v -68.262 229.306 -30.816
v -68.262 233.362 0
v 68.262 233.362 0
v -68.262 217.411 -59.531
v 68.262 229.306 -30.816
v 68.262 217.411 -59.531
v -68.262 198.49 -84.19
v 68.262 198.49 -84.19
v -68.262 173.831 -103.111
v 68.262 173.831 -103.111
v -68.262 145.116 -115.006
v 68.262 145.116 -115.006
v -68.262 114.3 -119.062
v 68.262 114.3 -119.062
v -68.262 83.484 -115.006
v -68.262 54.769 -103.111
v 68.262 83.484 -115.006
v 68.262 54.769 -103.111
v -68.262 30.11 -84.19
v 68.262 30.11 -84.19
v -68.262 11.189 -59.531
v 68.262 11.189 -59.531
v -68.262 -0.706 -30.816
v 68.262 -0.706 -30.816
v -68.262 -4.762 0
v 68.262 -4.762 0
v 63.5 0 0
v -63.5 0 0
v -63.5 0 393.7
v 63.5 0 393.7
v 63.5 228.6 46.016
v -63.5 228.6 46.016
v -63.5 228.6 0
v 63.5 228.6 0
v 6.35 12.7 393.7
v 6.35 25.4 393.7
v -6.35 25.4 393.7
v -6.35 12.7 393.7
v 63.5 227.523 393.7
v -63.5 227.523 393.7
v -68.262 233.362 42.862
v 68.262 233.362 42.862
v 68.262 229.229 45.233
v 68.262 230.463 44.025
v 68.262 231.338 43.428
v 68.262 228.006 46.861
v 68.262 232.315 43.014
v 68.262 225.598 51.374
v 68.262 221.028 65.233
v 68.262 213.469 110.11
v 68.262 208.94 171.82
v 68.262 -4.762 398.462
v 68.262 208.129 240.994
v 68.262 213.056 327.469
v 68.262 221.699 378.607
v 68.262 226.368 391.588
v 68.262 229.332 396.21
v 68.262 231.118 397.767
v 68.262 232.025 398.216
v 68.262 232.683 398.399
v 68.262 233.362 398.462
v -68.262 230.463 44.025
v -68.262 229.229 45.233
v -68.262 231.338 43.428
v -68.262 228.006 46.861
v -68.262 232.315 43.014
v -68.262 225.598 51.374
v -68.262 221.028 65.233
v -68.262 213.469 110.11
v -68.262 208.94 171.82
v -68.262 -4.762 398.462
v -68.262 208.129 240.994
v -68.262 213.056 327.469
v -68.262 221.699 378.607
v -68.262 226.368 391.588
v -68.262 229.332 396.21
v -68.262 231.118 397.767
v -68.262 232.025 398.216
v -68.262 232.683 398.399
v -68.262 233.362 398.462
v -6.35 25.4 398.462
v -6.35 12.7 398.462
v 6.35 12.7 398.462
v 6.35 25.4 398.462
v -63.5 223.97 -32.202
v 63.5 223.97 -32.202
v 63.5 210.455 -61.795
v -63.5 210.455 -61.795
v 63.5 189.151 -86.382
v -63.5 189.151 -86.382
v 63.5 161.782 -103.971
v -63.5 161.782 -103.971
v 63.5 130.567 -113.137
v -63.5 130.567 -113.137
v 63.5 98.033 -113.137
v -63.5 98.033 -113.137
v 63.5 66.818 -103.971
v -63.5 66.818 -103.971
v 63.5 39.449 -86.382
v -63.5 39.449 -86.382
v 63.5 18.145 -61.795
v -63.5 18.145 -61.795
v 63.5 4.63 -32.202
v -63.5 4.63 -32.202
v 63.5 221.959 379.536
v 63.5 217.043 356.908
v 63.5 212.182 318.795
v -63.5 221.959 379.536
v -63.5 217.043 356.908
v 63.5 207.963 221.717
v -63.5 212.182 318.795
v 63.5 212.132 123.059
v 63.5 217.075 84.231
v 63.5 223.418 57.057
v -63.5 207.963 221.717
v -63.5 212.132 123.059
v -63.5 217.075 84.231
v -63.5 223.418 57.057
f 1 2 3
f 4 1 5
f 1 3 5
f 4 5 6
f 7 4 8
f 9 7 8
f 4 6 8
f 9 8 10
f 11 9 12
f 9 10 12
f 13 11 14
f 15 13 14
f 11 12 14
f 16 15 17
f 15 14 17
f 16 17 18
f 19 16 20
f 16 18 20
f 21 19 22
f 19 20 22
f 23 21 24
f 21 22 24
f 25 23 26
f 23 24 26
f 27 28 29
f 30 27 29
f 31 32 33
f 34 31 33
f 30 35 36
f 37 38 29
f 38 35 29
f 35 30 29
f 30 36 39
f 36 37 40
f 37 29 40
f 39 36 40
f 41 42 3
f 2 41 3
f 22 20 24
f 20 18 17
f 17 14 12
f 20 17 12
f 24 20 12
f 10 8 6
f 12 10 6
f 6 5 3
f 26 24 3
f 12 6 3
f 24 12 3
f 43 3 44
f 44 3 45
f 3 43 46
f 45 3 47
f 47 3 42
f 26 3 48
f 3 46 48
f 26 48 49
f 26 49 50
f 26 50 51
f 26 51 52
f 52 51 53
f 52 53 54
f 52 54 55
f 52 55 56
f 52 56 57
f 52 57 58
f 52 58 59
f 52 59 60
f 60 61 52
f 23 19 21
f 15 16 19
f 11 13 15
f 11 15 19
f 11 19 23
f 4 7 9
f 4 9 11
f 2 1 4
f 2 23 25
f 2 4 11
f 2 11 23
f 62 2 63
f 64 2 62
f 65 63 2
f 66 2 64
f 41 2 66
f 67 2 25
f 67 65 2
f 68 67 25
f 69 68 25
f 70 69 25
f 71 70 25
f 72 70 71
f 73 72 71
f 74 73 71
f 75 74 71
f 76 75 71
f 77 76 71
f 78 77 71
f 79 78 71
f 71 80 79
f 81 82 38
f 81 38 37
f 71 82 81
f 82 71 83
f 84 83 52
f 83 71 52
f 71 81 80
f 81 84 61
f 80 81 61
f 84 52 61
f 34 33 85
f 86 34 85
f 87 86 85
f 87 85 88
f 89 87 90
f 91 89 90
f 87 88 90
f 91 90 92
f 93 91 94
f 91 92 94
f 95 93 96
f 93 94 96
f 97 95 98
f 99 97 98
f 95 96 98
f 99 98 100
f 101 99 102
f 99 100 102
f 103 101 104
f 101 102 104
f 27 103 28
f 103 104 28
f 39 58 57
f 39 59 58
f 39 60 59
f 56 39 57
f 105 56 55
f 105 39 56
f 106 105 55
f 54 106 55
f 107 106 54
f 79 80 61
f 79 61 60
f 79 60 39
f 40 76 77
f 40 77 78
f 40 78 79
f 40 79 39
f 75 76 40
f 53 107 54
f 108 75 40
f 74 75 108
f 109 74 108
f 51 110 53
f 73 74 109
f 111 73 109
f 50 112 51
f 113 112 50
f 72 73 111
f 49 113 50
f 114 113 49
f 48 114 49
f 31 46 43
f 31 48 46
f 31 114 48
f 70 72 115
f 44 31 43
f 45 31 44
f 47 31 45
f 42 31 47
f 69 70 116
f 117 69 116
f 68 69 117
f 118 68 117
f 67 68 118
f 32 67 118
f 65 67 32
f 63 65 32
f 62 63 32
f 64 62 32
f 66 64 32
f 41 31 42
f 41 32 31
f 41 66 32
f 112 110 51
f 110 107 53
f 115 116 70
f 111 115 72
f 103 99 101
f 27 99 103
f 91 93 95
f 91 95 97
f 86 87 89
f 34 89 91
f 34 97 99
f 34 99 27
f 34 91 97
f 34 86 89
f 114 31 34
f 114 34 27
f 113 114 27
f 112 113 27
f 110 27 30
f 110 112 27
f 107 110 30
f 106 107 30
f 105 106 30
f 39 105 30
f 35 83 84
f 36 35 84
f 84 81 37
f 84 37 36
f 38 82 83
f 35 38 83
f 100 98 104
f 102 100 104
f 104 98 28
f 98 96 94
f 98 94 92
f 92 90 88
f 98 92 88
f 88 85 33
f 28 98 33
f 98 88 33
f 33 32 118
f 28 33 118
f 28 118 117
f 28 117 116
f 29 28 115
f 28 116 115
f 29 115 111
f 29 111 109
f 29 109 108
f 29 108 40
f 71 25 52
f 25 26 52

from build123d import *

# Parameters (mm, degrees)
BOSS_EXTRUDE1_DEPTH      = 63.5
BOSS_EXTRUDE1_DEPTH_BACK = 63.5
CUT_EXTRUDE1_REACH       = 573.246
SKETCH4_W                = 12.7
SKETCH4_H                = 12.7
BOSS_EXTRUDE3_DEPTH      = 4.7625
CUT_EXTRUDE2_DEPTH       = 467.787091958
CUT_EXTRUDE2_DEPTH_BACK  = 467.787091958
SKETCH11_RX              = 177.8
SKETCH11_RY              = 25.4


with BuildPart() as part:
    # Sketch2 → Boss-Extrude1 (new, two sides: drawn at the far end of the back side and taken through both)
    with BuildSketch(Plane(origin=(0, 0, 0), x_dir=(0, 0, -1), z_dir=(1, 0, 0)).offset(-BOSS_EXTRUDE1_DEPTH_BACK)):
        with BuildLine():
            Line((0, -4.7625), (-398.4625, -4.7625))
            Line((-398.4625, -4.7625), (-398.4625, 233.3625))
            Line((-398.4625, 233.3625), (0, 233.3625))
            ThreePointArc((0, 233.3625), (119.0625, 114.3), (0, -4.7625))
        make_face()
        with BuildLine():
            Line((0, 0), (-393.7, 0))
            Line((-393.7, 0), (-393.7, 228.6))
            Line((-393.7, 228.6), (0, 228.6))
            ThreePointArc((0, 228.6), (114.3, 114.3), (0, 0))
        make_face(mode=Mode.SUBTRACT)
    extrude(amount=BOSS_EXTRUDE1_DEPTH + BOSS_EXTRUDE1_DEPTH_BACK)

    # Sketch4 → Cut-Extrude1 (cut, up to next)
    with BuildSketch(Plane.XY.offset(398.4625), mode=Mode.PRIVATE) as cut_extrude1_sk1:
        with Locations((0, 19.05)):
            Rectangle(SKETCH4_W, SKETCH4_H)
    cut_extrude1_tool1 = extrude(cut_extrude1_sk1.sketch, amount=-CUT_EXTRUDE1_REACH, mode=Mode.PRIVATE) & part.part
    add(cut_extrude1_tool1.solids().sort_by_distance((0, 19.05, 398.4625))[0], mode=Mode.SUBTRACT)

    # Sketch9 → Boss-Extrude3 (add)
    with BuildSketch(Plane(origin=(63.5, 0, 0), x_dir=(0, 0, -1), z_dir=(1, 0, 0))):
        with BuildLine():
            Line((-398.4625, 233.3625), (0, 233.3625))
            ThreePointArc((0, 233.3625), (119.0625, 114.3), (0, -4.7625))
            Line((0, -4.7625), (-398.4625, -4.7625))
            Line((-398.4625, -4.7625), (-398.4625, 233.3625))
        make_face()
    boss_extrude3 = extrude(amount=BOSS_EXTRUDE3_DEPTH)

    # Mirror1: Boss-Extrude3 across plane
    add(boss_extrude3.mirror(Plane(origin=(0, 0, 0), x_dir=(0, 0, 1), z_dir=(1, 0, 0))))

    # Sketch11 → Cut-Extrude2 (cut, two sides: drawn at the far end of the back side and taken through both)
    with BuildSketch(Plane(origin=(0, 0, 0), x_dir=(0, 0, -1), z_dir=(1, 0, 0)).offset(-CUT_EXTRUDE2_DEPTH_BACK)):
        with Locations(Location((-220.6625, 233.3625), (0, 0, -180))):
            Ellipse(SKETCH11_RX, SKETCH11_RY)
    extrude(amount=CUT_EXTRUDE2_DEPTH + CUT_EXTRUDE2_DEPTH_BACK, mode=Mode.SUBTRACT)


solid = part.part
